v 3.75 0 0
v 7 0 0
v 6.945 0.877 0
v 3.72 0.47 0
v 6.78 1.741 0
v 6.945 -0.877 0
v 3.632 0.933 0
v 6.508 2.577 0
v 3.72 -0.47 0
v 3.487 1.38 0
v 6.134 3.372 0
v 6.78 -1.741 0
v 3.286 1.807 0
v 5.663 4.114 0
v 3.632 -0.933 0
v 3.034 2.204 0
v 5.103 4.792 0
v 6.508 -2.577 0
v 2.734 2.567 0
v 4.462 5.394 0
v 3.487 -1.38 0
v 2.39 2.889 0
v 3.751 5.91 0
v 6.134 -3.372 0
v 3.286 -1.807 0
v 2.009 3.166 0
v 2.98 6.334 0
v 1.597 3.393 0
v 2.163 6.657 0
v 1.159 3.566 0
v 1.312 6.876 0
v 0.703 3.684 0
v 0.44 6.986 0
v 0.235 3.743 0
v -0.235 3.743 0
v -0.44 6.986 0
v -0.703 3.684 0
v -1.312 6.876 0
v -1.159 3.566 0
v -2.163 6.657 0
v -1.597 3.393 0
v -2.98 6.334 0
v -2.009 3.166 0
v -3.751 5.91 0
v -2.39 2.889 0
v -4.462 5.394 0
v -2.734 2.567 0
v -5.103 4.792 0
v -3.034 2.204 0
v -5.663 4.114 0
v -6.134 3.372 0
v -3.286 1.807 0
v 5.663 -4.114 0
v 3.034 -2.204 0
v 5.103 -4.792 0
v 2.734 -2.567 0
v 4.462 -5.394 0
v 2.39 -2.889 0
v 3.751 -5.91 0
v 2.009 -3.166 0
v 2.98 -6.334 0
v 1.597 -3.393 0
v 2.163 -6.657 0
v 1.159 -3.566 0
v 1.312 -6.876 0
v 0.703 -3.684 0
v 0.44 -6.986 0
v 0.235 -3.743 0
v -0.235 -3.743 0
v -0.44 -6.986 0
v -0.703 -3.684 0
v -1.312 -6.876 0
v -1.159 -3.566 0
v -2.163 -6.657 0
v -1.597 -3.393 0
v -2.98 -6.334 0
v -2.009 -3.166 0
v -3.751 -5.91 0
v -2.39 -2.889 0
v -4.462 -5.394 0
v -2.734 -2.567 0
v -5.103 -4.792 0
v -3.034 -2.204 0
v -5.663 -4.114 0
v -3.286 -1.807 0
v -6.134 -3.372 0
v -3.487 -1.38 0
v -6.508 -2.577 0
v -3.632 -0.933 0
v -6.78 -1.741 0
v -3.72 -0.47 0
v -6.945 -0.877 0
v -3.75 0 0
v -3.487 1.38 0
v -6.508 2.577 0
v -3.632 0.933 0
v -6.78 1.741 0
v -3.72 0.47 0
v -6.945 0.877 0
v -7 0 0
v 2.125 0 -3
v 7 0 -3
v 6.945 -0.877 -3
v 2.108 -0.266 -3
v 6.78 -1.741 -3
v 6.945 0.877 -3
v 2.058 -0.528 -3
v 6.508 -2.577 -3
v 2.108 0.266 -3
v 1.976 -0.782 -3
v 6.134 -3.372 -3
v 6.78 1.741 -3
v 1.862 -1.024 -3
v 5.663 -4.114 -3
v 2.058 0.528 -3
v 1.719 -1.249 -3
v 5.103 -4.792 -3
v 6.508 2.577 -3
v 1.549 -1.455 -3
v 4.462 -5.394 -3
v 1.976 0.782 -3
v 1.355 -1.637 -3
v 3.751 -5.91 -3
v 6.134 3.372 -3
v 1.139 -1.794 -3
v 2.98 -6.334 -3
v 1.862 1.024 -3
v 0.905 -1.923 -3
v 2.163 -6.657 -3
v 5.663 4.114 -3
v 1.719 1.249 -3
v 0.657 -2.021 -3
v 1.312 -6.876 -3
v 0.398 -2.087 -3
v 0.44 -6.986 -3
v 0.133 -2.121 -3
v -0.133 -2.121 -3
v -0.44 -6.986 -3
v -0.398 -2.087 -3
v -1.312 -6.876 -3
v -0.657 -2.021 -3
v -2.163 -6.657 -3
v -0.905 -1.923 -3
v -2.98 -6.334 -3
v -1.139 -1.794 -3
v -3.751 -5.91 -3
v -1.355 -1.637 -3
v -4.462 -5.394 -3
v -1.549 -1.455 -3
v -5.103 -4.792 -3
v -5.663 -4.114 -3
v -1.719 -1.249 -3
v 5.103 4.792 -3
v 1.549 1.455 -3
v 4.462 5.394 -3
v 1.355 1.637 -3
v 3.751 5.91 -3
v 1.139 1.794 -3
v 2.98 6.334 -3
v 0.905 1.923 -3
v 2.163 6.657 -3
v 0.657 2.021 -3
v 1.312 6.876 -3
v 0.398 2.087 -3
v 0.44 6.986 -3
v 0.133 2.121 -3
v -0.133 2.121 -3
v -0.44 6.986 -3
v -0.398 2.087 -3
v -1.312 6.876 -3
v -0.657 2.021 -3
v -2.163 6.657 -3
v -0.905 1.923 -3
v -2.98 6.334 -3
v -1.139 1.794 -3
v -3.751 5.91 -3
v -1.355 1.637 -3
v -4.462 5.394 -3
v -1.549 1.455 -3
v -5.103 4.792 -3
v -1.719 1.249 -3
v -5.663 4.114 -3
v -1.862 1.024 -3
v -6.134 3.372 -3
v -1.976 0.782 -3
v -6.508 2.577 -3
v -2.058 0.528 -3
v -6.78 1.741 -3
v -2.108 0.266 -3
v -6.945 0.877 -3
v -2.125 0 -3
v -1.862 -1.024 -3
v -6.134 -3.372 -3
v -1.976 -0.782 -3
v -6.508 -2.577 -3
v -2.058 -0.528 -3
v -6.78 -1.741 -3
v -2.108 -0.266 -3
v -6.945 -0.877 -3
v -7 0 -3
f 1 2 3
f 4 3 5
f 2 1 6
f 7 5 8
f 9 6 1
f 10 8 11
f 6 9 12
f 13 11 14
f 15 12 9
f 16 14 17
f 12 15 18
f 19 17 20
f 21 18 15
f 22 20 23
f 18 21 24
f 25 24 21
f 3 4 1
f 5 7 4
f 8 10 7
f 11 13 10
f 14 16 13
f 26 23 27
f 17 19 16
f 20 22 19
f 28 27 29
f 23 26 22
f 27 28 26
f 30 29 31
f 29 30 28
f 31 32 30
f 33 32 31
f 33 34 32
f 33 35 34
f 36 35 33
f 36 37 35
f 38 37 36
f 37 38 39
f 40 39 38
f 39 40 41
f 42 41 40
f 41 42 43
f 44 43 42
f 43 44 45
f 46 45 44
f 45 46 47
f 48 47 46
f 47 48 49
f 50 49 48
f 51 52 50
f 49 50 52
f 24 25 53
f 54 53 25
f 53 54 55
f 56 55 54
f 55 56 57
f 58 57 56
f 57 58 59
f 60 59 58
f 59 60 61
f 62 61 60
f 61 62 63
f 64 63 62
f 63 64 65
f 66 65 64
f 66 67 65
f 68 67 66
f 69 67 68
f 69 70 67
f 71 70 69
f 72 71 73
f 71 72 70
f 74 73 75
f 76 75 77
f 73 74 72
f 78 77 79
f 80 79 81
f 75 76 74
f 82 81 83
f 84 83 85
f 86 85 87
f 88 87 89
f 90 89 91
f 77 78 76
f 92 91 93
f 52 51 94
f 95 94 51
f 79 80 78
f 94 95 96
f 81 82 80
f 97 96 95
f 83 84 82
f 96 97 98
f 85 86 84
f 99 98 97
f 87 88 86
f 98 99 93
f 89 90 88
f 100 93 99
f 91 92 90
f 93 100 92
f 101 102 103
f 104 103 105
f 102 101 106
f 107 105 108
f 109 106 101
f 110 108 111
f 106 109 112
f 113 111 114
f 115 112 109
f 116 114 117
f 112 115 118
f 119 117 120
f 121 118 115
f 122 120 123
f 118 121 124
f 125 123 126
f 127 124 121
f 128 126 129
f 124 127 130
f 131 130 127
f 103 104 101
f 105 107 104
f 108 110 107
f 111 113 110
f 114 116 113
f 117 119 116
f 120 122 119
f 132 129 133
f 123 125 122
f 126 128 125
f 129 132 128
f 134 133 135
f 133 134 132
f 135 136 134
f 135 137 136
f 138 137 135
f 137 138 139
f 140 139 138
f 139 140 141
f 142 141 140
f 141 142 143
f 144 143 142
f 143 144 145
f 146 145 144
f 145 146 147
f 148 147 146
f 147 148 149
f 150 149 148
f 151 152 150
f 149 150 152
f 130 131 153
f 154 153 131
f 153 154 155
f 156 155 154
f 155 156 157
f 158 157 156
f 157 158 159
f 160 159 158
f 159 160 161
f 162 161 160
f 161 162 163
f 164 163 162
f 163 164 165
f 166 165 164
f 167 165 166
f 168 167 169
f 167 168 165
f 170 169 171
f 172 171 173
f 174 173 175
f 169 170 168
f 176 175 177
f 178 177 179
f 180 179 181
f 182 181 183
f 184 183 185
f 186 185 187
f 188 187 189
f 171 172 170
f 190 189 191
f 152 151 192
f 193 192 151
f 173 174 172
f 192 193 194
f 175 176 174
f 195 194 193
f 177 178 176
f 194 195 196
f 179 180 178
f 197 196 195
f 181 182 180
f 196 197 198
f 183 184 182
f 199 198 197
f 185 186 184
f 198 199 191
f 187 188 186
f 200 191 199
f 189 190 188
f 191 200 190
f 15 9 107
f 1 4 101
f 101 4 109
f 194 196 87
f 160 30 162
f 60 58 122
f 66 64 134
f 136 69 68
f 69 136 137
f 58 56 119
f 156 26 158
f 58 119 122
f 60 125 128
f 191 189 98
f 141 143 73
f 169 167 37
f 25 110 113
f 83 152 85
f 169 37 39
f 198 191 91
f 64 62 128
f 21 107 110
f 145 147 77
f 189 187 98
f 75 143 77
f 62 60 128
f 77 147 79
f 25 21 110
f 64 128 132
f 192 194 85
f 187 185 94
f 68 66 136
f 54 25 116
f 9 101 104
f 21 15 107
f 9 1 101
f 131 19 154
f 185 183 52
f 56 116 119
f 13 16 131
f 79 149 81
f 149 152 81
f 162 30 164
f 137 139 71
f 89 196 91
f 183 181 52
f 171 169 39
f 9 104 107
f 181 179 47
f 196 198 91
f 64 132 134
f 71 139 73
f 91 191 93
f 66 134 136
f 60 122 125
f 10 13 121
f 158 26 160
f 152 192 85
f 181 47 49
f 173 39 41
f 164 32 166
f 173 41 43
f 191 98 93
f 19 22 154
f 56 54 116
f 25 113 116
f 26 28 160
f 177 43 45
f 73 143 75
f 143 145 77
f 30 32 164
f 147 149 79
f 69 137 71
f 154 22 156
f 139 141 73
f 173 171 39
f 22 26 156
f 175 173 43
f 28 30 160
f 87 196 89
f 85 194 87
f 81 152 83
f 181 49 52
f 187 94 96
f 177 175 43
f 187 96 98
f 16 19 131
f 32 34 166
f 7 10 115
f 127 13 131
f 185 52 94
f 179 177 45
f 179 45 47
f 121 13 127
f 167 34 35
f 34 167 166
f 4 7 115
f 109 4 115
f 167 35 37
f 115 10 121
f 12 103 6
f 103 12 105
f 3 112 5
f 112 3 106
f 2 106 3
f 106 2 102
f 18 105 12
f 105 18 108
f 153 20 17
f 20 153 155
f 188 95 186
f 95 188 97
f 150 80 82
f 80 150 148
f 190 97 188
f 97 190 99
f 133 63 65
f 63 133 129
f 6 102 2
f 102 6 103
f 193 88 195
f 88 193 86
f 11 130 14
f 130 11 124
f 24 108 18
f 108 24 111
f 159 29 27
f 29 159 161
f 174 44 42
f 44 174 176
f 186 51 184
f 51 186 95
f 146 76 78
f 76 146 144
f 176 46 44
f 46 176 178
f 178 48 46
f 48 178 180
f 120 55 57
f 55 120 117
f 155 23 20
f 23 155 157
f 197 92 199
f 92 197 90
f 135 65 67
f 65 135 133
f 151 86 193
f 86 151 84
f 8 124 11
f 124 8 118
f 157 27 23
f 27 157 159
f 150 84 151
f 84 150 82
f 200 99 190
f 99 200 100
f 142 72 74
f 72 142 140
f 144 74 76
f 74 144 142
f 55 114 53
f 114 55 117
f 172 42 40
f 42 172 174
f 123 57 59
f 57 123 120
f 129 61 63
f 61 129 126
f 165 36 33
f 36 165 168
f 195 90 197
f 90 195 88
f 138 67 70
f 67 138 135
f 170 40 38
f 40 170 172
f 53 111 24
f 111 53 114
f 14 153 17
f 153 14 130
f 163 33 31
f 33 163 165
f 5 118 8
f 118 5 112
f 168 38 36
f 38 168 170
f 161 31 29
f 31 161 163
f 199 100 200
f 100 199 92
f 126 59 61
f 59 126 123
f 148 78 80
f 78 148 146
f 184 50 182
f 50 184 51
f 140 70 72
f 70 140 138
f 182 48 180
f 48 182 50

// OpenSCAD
$fn = 50;


difference() {
	union() {
		translate(v = [0, 0, -3.0000000000]) {
			cylinder(h = 3, r = 7.0000000000);
		}
		cylinder(h = 0, r = 17.0000000000);
	}
	union() {
		translate(v = [0, 0, 0]) {
			rotate(a = [0, 0, 0]) {
				difference() {
					union() {
						#translate(v = [0, 0, -3.0000000000]) {
							cylinder(h = 3, r = 2.0000000000);
						}
						#translate(v = [0, 0, -3]) {
							cylinder(h = 3, r = 7.0000000000, r1 = 2.1250000000, r2 = 3.7500000000);
						}
						#translate(v = [0, 0, -3.0000000000]) {
							cylinder(h = 3, r = 2.1250000000);
						}
						#translate(v = [0, 0, -3.0000000000]) {
							cylinder(h = 3, r = 2.0000000000);
						}
					}
					union();
				}
			}
		}
	}
}
